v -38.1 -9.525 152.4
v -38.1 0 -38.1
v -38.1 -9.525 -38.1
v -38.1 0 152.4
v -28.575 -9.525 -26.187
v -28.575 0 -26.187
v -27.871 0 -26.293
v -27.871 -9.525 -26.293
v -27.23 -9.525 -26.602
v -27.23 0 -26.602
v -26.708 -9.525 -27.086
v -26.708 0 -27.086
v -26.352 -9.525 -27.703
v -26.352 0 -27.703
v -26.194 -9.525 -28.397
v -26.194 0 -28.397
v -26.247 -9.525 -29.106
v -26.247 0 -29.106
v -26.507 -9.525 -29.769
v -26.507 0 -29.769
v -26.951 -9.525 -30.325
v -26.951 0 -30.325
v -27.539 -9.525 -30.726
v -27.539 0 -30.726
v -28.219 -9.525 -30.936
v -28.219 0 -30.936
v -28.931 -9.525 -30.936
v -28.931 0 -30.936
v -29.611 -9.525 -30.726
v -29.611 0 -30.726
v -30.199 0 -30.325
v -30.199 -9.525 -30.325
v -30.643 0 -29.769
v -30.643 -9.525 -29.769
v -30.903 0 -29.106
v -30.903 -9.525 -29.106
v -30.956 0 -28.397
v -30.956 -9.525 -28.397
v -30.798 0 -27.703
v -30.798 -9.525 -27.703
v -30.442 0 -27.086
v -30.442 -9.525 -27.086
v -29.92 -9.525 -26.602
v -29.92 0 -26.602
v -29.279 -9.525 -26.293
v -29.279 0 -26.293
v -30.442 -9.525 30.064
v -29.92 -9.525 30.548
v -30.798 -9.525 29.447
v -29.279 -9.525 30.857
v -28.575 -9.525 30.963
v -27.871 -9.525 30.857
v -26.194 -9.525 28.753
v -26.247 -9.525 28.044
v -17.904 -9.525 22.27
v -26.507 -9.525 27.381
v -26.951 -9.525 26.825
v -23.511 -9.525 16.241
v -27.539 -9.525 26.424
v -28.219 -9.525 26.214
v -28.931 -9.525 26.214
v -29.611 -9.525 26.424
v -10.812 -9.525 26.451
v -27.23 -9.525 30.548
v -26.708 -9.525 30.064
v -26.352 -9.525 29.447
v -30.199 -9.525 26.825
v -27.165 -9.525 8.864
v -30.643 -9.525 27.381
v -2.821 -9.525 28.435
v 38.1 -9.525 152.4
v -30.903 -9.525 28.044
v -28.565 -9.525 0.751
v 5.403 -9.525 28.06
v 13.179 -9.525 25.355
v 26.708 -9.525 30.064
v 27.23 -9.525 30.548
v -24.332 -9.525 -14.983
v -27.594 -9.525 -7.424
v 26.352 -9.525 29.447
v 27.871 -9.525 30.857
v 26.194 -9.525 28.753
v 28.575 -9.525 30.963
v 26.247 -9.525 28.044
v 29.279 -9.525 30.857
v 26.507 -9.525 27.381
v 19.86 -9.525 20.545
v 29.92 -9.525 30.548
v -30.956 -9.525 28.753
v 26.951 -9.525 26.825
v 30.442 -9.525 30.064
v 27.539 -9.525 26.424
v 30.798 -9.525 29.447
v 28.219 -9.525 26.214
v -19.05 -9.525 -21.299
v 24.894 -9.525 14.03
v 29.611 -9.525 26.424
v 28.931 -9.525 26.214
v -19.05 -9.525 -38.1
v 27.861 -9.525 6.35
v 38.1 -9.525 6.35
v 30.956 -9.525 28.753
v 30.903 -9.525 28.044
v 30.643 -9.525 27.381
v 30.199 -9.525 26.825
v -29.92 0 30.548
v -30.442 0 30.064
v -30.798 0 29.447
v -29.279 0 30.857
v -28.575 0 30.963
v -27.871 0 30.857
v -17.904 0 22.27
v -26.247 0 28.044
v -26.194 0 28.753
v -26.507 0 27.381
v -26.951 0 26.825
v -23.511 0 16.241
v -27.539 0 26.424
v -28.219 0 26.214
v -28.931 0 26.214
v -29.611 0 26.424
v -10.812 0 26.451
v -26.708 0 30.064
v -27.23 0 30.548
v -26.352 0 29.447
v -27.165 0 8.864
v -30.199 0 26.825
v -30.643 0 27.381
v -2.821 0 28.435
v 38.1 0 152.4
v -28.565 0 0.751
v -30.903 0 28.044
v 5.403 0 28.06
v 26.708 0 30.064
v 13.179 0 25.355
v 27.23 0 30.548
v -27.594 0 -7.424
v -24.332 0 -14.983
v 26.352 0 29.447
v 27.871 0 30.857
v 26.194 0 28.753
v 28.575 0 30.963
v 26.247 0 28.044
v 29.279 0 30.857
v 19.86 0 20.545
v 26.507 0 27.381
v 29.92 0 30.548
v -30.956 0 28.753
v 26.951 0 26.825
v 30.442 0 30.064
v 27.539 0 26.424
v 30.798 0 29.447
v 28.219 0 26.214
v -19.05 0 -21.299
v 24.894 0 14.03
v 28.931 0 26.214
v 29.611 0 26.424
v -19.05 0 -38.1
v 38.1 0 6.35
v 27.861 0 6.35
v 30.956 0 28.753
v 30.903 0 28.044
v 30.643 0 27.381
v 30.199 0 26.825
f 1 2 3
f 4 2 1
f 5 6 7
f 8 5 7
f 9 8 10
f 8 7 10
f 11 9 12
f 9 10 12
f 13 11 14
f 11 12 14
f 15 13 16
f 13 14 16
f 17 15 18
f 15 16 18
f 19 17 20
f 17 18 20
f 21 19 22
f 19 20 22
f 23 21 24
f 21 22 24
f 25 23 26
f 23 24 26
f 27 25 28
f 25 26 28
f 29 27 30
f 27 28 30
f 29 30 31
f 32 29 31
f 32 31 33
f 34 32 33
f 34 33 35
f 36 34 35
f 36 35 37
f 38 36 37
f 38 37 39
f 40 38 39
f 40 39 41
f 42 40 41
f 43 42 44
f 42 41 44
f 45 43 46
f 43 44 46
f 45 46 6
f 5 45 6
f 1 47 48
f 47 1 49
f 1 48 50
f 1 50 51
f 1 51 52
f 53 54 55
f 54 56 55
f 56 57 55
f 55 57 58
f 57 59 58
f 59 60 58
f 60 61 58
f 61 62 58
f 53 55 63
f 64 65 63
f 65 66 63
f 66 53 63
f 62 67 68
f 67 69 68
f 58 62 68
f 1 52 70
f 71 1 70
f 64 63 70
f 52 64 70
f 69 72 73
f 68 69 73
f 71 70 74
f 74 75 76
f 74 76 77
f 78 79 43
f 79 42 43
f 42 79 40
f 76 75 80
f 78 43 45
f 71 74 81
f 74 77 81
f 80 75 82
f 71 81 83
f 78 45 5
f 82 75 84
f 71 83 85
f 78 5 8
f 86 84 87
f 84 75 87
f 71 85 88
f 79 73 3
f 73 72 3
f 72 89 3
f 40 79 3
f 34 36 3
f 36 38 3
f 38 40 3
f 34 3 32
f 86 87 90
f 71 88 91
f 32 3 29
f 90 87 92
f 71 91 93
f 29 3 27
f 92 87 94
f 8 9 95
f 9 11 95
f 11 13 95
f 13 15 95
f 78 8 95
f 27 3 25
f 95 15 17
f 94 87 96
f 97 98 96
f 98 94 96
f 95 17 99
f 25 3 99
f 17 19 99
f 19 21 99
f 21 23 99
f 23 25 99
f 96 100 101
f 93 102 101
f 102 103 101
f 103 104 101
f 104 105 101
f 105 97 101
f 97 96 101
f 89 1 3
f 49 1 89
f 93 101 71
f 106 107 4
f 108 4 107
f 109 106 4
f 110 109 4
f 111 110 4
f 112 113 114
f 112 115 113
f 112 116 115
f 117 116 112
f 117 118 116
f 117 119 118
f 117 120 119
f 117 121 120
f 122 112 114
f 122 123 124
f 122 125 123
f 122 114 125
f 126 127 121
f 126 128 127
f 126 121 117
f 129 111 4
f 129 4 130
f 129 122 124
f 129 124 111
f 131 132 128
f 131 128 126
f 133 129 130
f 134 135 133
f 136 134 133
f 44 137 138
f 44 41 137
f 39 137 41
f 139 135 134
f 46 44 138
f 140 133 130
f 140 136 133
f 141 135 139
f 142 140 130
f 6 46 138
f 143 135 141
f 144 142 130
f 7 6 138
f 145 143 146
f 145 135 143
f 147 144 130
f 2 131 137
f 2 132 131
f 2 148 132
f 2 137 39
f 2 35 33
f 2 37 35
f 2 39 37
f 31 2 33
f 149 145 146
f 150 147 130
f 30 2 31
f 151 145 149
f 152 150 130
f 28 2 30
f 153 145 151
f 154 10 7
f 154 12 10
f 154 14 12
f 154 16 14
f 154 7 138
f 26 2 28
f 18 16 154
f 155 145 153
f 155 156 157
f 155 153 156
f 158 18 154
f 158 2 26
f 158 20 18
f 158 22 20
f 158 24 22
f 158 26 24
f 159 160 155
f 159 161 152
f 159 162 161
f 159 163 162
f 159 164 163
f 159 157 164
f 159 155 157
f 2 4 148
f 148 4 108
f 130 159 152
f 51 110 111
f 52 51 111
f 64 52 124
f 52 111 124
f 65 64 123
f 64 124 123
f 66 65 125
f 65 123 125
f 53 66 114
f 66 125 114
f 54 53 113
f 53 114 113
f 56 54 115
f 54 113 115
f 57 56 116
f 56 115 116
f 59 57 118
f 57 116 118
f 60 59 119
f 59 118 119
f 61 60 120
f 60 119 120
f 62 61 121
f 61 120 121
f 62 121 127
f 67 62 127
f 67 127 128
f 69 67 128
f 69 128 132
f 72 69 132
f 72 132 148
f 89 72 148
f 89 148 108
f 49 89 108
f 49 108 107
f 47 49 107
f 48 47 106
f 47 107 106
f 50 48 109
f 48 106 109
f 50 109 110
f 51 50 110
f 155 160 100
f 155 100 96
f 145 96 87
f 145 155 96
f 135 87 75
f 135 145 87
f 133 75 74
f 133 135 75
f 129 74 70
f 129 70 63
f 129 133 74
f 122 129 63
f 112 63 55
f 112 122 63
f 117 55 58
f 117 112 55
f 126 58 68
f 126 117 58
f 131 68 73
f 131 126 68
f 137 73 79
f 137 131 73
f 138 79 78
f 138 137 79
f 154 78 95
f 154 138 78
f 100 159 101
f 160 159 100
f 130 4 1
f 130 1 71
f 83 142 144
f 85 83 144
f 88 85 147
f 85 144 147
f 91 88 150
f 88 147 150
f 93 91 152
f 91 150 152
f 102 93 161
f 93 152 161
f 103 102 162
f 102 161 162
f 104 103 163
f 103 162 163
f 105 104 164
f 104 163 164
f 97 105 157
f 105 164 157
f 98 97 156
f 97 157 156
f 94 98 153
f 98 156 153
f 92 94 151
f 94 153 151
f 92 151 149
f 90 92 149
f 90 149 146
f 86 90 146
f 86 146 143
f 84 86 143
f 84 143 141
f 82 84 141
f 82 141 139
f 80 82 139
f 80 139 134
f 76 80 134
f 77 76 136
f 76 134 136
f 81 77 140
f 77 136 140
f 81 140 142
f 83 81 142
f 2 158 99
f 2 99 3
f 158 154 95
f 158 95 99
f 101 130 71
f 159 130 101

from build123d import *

# Parameters (mm, degrees)
SKETCH1_R      = 2.3876
EXTRUDE1_DEPTH = 9.525


with BuildPart() as part:
    # Sketch1 → Extrude1 (new body)
    with BuildSketch(Plane(origin=(0, 0, 0), x_dir=(1, 0, 0), z_dir=(0, 1, 0))):
        with BuildLine():
            Line((-38.1, 38.1), (-38.1, -152.4))
            Line((-38.1, -152.4), (38.1, -152.4))
            Line((38.1, -152.4), (38.1, -6.35))
            Line((38.1, -6.35), (27.86051193, -6.35))
            ThreePointArc((27.86051193, -6.35), (-14.509197932, -24.617347549), (-19.05, 21.298547486))
            Line((-19.05, 21.298547486), (-19.05, 38.1))
            Line((-19.05, 38.1), (-38.1, 38.1))
        make_face()
        with Locations((-28.575, 28.575)):
            Circle(SKETCH1_R, mode=Mode.SUBTRACT)
        with Locations((28.575, -28.575)):
            Circle(SKETCH1_R, mode=Mode.SUBTRACT)
        with Locations((-28.575, -28.575)):
            Circle(SKETCH1_R, mode=Mode.SUBTRACT)
    extrude(amount=-EXTRUDE1_DEPTH)


solid = part.part
